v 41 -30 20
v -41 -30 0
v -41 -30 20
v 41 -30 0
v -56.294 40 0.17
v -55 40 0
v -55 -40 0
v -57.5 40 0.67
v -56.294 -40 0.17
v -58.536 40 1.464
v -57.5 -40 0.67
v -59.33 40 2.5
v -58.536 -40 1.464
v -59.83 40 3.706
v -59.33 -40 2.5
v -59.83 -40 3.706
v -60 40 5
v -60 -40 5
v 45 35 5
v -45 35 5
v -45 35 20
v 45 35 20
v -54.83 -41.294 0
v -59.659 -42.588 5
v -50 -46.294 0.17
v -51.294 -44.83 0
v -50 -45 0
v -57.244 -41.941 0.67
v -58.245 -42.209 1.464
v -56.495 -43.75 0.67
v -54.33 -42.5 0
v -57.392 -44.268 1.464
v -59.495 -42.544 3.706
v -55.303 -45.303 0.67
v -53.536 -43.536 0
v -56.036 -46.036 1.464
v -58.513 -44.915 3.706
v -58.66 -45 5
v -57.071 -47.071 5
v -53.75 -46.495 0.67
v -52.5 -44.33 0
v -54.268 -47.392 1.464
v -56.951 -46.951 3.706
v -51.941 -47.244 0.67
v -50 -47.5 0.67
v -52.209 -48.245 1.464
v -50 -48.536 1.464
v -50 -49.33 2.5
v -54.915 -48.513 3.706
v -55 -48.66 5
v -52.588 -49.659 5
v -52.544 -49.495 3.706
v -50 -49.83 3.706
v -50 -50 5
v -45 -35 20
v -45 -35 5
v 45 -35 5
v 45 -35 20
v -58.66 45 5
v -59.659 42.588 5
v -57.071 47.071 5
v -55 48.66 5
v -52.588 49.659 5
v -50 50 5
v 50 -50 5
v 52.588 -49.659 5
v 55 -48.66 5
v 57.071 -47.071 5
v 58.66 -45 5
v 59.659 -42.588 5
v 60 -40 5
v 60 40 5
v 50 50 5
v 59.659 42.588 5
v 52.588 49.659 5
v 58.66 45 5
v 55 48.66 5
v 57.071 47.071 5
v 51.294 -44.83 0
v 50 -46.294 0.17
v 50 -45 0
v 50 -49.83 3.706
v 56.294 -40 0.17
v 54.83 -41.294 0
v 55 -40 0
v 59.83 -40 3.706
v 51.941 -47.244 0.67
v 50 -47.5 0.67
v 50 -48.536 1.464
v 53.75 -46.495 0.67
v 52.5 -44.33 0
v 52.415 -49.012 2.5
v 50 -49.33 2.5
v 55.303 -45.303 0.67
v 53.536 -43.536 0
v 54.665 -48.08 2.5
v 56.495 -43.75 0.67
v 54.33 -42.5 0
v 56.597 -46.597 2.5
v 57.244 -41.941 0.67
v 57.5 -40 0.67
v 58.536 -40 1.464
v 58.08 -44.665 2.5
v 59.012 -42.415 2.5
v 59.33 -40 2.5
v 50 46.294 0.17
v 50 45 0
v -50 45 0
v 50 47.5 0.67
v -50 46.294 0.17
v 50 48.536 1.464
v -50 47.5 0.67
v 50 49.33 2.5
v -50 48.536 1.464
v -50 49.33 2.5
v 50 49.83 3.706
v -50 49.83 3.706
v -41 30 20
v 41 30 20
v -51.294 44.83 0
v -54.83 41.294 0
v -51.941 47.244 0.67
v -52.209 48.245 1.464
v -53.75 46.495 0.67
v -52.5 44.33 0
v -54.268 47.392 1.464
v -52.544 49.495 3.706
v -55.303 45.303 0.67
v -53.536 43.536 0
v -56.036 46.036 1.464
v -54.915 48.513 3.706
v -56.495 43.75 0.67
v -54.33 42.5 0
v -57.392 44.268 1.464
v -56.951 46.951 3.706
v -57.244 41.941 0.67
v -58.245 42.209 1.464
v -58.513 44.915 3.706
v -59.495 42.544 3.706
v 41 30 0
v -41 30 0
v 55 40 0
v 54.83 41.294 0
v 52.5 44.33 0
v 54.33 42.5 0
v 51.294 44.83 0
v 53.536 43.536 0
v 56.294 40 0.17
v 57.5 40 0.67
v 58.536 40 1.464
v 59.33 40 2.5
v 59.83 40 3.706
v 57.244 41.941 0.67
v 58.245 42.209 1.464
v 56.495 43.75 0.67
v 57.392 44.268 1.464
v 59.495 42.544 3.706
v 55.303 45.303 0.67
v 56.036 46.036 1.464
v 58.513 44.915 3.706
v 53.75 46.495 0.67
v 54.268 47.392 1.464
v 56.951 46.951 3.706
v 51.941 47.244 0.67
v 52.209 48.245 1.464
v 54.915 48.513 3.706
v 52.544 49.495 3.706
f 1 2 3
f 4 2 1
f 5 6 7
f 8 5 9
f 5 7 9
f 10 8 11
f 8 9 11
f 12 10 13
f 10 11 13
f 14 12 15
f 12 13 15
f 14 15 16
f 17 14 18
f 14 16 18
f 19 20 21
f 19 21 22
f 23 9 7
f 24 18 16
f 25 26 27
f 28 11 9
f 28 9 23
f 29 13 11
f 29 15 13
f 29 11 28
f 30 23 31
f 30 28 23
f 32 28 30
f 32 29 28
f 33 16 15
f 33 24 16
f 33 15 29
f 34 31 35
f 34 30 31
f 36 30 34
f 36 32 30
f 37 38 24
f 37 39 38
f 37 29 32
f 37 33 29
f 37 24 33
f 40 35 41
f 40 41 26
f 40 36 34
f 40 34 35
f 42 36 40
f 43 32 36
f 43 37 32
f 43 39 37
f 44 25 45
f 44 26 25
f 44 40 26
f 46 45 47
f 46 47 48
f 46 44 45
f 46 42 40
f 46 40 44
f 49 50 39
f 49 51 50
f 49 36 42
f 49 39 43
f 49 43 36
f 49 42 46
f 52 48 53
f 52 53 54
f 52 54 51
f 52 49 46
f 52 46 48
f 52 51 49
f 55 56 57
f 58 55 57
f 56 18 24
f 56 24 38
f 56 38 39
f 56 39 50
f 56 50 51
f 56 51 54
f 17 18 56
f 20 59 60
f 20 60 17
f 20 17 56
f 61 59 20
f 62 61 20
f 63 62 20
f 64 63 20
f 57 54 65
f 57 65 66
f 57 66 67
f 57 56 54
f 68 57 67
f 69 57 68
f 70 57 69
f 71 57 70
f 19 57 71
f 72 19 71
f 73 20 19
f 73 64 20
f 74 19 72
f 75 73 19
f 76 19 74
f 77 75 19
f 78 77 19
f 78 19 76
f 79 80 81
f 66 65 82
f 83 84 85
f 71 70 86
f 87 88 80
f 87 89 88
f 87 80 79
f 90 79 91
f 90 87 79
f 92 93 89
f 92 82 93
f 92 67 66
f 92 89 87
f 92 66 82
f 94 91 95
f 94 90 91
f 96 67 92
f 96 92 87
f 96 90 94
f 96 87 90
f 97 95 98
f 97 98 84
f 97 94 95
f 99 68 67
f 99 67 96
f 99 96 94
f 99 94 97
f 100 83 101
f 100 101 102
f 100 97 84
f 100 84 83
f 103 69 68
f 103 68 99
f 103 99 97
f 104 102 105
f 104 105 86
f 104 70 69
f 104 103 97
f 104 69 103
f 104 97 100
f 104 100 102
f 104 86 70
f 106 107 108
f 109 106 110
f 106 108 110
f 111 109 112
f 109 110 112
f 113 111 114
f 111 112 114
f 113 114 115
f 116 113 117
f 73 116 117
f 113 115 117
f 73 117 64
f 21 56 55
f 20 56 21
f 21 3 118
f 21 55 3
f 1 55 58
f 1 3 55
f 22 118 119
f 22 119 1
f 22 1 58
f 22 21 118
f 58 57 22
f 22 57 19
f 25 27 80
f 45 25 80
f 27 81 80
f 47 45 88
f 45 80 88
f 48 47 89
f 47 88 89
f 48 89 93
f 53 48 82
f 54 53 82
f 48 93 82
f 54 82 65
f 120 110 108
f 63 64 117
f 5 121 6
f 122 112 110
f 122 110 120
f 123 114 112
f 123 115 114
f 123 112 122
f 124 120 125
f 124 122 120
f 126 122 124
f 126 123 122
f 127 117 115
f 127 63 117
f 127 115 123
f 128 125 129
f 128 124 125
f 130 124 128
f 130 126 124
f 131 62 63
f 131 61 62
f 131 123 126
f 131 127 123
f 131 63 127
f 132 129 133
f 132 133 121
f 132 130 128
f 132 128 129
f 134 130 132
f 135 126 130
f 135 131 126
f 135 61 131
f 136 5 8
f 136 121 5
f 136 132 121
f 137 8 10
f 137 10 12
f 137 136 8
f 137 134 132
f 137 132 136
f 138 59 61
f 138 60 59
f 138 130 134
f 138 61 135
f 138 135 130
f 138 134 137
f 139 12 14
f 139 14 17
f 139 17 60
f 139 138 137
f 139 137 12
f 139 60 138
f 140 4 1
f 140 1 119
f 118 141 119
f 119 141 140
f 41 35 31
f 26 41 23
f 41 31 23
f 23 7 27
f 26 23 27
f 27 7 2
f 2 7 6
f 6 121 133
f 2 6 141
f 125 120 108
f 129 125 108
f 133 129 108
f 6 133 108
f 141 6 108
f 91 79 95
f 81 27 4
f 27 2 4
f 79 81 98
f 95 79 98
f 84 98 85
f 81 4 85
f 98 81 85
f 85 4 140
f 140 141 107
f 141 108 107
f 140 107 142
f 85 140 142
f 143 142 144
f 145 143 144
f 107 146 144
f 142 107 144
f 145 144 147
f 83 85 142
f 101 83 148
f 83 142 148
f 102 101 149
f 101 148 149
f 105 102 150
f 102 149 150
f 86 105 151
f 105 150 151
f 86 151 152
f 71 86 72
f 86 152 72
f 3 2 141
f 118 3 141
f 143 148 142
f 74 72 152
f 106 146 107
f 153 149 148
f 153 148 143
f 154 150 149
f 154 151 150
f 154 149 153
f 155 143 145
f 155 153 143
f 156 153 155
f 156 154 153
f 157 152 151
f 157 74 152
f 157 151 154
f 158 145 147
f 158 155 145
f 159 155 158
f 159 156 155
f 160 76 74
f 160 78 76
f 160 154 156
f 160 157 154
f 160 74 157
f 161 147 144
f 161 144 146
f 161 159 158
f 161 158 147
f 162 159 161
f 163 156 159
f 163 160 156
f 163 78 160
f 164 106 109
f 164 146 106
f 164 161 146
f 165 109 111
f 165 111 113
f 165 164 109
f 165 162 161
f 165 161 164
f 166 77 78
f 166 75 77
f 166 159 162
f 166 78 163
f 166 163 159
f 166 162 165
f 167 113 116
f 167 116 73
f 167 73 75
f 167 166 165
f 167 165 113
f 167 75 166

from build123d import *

# Parameters (mm, degrees)
F0_W     = 90
F0_H     = 70
F0_W_2   = 82
F0_H_2   = 60
F1_DEPTH = 5
F2_DEPTH = 20
F3_DEPTH = 20
F4_R     = 4.99999


# Not quite as in the source:
# - a fillet or chamfer is up to 0.001 mm smaller than in the source, because OpenCascade refuses the exact size
# - a feature names something its author has since deleted; it is built from what else it names


with BuildPart() as f1:
    # F0 (on Top) → F1 (new body)
    with BuildSketch(Plane.XY):
        with BuildLine():
            Line((-50, -50), (50, -50))
            ThreePointArc((50, -50), (57.0710678119, -47.0710678119), (60, -40))
            Line((60, -40), (60, 40))
            ThreePointArc((60, 40), (57.0710678119, 47.0710678119), (50, 50))
            Line((50, 50), (-50, 50))
            ThreePointArc((-50, 50), (-57.0710678119, 47.0710678119), (-60, 40))
            Line((-60, 40), (-60, -40))
            ThreePointArc((-60, -40), (-57.0710678119, -47.0710678119), (-50, -50))
        make_face()
        Rectangle(F0_W, F0_H, mode=Mode.SUBTRACT)
        Rectangle(F0_W, F0_H)
        Rectangle(F0_W_2, F0_H_2, mode=Mode.SUBTRACT)
    extrude(amount=F1_DEPTH)

    # F0 (on Top) → F2 (join)
    with BuildSketch(Plane.XY):
        Rectangle(F0_W, F0_H)
        Rectangle(F0_W_2, F0_H_2, mode=Mode.SUBTRACT)
        Rectangle(F0_W_2, F0_H_2)
    extrude(amount=F2_DEPTH)

    # F0 (on Top) → F3 (cut)
    with BuildSketch(Plane.XY):
        Rectangle(F0_W_2, F0_H_2)
    extrude(amount=F3_DEPTH, mode=Mode.SUBTRACT)

    # F4 (radius 5 in the source; OpenCascade refuses exactly that, so slightly less here)
    f4_edges = [f1.edges().sort_by_distance(p)[0] for p in [
        (57.071068, -47.071068, 0),
    ]]
    fillet(f4_edges, radius=F4_R)


solid = f1.part
